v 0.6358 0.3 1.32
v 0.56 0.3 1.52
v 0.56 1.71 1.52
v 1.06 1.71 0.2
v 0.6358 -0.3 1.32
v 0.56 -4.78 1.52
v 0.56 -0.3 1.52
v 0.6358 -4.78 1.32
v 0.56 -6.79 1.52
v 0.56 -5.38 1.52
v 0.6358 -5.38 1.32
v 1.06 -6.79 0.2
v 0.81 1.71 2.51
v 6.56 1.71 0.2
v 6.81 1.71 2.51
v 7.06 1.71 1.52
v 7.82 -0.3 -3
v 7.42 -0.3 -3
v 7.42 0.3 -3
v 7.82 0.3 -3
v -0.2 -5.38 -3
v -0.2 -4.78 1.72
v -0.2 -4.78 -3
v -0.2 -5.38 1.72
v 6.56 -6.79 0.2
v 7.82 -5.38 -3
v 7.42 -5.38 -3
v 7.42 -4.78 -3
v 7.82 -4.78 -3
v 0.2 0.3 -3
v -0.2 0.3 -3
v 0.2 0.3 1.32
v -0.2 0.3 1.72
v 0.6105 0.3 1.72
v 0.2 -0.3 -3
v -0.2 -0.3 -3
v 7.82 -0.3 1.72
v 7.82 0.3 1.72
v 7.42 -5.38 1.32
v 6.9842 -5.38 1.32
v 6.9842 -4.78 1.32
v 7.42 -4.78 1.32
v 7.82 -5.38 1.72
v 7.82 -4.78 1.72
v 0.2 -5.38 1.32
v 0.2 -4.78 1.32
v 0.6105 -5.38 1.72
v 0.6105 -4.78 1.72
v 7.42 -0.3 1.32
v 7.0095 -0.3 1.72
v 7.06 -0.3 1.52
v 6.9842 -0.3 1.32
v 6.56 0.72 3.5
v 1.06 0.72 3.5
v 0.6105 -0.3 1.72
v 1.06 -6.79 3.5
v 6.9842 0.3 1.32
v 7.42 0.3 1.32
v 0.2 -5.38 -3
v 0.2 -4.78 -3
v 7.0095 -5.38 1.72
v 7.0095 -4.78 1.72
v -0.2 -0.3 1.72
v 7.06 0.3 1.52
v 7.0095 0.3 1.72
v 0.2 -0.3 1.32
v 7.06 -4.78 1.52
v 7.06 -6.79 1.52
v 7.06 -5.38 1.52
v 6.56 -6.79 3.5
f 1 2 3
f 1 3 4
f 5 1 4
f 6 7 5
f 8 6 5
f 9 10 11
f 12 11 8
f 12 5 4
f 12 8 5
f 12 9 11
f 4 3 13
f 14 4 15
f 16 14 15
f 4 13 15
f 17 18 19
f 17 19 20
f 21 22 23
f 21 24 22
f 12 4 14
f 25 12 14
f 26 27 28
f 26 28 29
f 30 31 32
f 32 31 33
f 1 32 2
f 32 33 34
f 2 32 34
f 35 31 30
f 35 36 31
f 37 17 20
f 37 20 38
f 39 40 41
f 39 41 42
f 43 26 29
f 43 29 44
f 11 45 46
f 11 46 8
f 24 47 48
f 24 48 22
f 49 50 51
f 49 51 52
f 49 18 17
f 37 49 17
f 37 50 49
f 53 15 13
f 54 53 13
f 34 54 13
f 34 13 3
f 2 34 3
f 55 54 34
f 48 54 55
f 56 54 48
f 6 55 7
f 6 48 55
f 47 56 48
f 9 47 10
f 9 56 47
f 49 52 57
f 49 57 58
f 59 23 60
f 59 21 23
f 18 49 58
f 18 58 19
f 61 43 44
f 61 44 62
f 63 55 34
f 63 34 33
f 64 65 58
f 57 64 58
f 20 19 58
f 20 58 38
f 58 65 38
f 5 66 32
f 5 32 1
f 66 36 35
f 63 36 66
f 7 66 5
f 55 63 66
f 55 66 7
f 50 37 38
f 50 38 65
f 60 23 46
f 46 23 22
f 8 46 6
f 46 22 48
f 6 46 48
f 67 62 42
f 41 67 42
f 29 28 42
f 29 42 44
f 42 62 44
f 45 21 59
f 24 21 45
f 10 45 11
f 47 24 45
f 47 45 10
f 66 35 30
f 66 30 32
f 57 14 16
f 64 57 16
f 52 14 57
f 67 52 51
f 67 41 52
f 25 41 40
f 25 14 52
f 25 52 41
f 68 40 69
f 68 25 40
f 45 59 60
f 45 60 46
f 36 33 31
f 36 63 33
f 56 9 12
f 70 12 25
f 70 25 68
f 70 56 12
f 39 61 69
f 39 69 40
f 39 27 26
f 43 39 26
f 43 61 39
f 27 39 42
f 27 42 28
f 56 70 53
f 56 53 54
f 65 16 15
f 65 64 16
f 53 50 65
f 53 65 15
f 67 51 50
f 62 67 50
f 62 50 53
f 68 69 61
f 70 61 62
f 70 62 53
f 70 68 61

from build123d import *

# Parameters (mm, degrees)
PAD002_DEPTH = 0.3
PAD_DEPTH    = 4.25
CHAMFER_SIZE = 0.99
PAD001_DEPTH = 0.3


with BuildPart() as pad002:
    # Sketch002 → Pad002 (new body, symmetric)
    with BuildSketch(Plane.XZ.offset(5.08)):
        Polygon((-0.2, -3), (0.2, -3), (0.2, 1.32), (7.42, 1.32), (7.42, -3), (7.82, -3), (7.82, 1.72), (-0.2, 1.72), align=None)
    extrude(amount=PAD002_DEPTH, both=True)


with BuildPart() as chamfer_body:
    # Sketch → Pad (new body, symmetric)
    with BuildSketch(Plane.XZ.offset(2.54)):
        Polygon((1.06, 0.2), (6.56, 0.2), (7.06, 1.52), (6.56, 3.5), (1.06, 3.5), (0.56, 1.52), align=None)
    extrude(amount=PAD_DEPTH, both=True)

    # Chamfer
    chamfer_edges = [chamfer_body.edges().sort_by_distance(p)[0] for p in [
        (3.81, 1.71, 3.5),
    ]]
    chamfer(chamfer_edges, length=CHAMFER_SIZE)


with BuildPart() as diode_bridge_dip_4_w7_62mm_p5_08mm:
    # Sketch001 → Pad001 (new body, symmetric)
    with BuildSketch(Plane.XZ):
        Polygon((-0.2, -3), (0.2, -3), (0.2, 1.32), (7.42, 1.32), (7.42, -3), (7.82, -3), (7.82, 1.72), (-0.2, 1.72), align=None)
    extrude(amount=PAD001_DEPTH, both=True)

    # Pad001_mp_cp: union Pad002, Chamfer body
    add(pad002.part)
    add(chamfer_body.part)


solid = diode_bridge_dip_4_w7_62mm_p5_08mm.part
